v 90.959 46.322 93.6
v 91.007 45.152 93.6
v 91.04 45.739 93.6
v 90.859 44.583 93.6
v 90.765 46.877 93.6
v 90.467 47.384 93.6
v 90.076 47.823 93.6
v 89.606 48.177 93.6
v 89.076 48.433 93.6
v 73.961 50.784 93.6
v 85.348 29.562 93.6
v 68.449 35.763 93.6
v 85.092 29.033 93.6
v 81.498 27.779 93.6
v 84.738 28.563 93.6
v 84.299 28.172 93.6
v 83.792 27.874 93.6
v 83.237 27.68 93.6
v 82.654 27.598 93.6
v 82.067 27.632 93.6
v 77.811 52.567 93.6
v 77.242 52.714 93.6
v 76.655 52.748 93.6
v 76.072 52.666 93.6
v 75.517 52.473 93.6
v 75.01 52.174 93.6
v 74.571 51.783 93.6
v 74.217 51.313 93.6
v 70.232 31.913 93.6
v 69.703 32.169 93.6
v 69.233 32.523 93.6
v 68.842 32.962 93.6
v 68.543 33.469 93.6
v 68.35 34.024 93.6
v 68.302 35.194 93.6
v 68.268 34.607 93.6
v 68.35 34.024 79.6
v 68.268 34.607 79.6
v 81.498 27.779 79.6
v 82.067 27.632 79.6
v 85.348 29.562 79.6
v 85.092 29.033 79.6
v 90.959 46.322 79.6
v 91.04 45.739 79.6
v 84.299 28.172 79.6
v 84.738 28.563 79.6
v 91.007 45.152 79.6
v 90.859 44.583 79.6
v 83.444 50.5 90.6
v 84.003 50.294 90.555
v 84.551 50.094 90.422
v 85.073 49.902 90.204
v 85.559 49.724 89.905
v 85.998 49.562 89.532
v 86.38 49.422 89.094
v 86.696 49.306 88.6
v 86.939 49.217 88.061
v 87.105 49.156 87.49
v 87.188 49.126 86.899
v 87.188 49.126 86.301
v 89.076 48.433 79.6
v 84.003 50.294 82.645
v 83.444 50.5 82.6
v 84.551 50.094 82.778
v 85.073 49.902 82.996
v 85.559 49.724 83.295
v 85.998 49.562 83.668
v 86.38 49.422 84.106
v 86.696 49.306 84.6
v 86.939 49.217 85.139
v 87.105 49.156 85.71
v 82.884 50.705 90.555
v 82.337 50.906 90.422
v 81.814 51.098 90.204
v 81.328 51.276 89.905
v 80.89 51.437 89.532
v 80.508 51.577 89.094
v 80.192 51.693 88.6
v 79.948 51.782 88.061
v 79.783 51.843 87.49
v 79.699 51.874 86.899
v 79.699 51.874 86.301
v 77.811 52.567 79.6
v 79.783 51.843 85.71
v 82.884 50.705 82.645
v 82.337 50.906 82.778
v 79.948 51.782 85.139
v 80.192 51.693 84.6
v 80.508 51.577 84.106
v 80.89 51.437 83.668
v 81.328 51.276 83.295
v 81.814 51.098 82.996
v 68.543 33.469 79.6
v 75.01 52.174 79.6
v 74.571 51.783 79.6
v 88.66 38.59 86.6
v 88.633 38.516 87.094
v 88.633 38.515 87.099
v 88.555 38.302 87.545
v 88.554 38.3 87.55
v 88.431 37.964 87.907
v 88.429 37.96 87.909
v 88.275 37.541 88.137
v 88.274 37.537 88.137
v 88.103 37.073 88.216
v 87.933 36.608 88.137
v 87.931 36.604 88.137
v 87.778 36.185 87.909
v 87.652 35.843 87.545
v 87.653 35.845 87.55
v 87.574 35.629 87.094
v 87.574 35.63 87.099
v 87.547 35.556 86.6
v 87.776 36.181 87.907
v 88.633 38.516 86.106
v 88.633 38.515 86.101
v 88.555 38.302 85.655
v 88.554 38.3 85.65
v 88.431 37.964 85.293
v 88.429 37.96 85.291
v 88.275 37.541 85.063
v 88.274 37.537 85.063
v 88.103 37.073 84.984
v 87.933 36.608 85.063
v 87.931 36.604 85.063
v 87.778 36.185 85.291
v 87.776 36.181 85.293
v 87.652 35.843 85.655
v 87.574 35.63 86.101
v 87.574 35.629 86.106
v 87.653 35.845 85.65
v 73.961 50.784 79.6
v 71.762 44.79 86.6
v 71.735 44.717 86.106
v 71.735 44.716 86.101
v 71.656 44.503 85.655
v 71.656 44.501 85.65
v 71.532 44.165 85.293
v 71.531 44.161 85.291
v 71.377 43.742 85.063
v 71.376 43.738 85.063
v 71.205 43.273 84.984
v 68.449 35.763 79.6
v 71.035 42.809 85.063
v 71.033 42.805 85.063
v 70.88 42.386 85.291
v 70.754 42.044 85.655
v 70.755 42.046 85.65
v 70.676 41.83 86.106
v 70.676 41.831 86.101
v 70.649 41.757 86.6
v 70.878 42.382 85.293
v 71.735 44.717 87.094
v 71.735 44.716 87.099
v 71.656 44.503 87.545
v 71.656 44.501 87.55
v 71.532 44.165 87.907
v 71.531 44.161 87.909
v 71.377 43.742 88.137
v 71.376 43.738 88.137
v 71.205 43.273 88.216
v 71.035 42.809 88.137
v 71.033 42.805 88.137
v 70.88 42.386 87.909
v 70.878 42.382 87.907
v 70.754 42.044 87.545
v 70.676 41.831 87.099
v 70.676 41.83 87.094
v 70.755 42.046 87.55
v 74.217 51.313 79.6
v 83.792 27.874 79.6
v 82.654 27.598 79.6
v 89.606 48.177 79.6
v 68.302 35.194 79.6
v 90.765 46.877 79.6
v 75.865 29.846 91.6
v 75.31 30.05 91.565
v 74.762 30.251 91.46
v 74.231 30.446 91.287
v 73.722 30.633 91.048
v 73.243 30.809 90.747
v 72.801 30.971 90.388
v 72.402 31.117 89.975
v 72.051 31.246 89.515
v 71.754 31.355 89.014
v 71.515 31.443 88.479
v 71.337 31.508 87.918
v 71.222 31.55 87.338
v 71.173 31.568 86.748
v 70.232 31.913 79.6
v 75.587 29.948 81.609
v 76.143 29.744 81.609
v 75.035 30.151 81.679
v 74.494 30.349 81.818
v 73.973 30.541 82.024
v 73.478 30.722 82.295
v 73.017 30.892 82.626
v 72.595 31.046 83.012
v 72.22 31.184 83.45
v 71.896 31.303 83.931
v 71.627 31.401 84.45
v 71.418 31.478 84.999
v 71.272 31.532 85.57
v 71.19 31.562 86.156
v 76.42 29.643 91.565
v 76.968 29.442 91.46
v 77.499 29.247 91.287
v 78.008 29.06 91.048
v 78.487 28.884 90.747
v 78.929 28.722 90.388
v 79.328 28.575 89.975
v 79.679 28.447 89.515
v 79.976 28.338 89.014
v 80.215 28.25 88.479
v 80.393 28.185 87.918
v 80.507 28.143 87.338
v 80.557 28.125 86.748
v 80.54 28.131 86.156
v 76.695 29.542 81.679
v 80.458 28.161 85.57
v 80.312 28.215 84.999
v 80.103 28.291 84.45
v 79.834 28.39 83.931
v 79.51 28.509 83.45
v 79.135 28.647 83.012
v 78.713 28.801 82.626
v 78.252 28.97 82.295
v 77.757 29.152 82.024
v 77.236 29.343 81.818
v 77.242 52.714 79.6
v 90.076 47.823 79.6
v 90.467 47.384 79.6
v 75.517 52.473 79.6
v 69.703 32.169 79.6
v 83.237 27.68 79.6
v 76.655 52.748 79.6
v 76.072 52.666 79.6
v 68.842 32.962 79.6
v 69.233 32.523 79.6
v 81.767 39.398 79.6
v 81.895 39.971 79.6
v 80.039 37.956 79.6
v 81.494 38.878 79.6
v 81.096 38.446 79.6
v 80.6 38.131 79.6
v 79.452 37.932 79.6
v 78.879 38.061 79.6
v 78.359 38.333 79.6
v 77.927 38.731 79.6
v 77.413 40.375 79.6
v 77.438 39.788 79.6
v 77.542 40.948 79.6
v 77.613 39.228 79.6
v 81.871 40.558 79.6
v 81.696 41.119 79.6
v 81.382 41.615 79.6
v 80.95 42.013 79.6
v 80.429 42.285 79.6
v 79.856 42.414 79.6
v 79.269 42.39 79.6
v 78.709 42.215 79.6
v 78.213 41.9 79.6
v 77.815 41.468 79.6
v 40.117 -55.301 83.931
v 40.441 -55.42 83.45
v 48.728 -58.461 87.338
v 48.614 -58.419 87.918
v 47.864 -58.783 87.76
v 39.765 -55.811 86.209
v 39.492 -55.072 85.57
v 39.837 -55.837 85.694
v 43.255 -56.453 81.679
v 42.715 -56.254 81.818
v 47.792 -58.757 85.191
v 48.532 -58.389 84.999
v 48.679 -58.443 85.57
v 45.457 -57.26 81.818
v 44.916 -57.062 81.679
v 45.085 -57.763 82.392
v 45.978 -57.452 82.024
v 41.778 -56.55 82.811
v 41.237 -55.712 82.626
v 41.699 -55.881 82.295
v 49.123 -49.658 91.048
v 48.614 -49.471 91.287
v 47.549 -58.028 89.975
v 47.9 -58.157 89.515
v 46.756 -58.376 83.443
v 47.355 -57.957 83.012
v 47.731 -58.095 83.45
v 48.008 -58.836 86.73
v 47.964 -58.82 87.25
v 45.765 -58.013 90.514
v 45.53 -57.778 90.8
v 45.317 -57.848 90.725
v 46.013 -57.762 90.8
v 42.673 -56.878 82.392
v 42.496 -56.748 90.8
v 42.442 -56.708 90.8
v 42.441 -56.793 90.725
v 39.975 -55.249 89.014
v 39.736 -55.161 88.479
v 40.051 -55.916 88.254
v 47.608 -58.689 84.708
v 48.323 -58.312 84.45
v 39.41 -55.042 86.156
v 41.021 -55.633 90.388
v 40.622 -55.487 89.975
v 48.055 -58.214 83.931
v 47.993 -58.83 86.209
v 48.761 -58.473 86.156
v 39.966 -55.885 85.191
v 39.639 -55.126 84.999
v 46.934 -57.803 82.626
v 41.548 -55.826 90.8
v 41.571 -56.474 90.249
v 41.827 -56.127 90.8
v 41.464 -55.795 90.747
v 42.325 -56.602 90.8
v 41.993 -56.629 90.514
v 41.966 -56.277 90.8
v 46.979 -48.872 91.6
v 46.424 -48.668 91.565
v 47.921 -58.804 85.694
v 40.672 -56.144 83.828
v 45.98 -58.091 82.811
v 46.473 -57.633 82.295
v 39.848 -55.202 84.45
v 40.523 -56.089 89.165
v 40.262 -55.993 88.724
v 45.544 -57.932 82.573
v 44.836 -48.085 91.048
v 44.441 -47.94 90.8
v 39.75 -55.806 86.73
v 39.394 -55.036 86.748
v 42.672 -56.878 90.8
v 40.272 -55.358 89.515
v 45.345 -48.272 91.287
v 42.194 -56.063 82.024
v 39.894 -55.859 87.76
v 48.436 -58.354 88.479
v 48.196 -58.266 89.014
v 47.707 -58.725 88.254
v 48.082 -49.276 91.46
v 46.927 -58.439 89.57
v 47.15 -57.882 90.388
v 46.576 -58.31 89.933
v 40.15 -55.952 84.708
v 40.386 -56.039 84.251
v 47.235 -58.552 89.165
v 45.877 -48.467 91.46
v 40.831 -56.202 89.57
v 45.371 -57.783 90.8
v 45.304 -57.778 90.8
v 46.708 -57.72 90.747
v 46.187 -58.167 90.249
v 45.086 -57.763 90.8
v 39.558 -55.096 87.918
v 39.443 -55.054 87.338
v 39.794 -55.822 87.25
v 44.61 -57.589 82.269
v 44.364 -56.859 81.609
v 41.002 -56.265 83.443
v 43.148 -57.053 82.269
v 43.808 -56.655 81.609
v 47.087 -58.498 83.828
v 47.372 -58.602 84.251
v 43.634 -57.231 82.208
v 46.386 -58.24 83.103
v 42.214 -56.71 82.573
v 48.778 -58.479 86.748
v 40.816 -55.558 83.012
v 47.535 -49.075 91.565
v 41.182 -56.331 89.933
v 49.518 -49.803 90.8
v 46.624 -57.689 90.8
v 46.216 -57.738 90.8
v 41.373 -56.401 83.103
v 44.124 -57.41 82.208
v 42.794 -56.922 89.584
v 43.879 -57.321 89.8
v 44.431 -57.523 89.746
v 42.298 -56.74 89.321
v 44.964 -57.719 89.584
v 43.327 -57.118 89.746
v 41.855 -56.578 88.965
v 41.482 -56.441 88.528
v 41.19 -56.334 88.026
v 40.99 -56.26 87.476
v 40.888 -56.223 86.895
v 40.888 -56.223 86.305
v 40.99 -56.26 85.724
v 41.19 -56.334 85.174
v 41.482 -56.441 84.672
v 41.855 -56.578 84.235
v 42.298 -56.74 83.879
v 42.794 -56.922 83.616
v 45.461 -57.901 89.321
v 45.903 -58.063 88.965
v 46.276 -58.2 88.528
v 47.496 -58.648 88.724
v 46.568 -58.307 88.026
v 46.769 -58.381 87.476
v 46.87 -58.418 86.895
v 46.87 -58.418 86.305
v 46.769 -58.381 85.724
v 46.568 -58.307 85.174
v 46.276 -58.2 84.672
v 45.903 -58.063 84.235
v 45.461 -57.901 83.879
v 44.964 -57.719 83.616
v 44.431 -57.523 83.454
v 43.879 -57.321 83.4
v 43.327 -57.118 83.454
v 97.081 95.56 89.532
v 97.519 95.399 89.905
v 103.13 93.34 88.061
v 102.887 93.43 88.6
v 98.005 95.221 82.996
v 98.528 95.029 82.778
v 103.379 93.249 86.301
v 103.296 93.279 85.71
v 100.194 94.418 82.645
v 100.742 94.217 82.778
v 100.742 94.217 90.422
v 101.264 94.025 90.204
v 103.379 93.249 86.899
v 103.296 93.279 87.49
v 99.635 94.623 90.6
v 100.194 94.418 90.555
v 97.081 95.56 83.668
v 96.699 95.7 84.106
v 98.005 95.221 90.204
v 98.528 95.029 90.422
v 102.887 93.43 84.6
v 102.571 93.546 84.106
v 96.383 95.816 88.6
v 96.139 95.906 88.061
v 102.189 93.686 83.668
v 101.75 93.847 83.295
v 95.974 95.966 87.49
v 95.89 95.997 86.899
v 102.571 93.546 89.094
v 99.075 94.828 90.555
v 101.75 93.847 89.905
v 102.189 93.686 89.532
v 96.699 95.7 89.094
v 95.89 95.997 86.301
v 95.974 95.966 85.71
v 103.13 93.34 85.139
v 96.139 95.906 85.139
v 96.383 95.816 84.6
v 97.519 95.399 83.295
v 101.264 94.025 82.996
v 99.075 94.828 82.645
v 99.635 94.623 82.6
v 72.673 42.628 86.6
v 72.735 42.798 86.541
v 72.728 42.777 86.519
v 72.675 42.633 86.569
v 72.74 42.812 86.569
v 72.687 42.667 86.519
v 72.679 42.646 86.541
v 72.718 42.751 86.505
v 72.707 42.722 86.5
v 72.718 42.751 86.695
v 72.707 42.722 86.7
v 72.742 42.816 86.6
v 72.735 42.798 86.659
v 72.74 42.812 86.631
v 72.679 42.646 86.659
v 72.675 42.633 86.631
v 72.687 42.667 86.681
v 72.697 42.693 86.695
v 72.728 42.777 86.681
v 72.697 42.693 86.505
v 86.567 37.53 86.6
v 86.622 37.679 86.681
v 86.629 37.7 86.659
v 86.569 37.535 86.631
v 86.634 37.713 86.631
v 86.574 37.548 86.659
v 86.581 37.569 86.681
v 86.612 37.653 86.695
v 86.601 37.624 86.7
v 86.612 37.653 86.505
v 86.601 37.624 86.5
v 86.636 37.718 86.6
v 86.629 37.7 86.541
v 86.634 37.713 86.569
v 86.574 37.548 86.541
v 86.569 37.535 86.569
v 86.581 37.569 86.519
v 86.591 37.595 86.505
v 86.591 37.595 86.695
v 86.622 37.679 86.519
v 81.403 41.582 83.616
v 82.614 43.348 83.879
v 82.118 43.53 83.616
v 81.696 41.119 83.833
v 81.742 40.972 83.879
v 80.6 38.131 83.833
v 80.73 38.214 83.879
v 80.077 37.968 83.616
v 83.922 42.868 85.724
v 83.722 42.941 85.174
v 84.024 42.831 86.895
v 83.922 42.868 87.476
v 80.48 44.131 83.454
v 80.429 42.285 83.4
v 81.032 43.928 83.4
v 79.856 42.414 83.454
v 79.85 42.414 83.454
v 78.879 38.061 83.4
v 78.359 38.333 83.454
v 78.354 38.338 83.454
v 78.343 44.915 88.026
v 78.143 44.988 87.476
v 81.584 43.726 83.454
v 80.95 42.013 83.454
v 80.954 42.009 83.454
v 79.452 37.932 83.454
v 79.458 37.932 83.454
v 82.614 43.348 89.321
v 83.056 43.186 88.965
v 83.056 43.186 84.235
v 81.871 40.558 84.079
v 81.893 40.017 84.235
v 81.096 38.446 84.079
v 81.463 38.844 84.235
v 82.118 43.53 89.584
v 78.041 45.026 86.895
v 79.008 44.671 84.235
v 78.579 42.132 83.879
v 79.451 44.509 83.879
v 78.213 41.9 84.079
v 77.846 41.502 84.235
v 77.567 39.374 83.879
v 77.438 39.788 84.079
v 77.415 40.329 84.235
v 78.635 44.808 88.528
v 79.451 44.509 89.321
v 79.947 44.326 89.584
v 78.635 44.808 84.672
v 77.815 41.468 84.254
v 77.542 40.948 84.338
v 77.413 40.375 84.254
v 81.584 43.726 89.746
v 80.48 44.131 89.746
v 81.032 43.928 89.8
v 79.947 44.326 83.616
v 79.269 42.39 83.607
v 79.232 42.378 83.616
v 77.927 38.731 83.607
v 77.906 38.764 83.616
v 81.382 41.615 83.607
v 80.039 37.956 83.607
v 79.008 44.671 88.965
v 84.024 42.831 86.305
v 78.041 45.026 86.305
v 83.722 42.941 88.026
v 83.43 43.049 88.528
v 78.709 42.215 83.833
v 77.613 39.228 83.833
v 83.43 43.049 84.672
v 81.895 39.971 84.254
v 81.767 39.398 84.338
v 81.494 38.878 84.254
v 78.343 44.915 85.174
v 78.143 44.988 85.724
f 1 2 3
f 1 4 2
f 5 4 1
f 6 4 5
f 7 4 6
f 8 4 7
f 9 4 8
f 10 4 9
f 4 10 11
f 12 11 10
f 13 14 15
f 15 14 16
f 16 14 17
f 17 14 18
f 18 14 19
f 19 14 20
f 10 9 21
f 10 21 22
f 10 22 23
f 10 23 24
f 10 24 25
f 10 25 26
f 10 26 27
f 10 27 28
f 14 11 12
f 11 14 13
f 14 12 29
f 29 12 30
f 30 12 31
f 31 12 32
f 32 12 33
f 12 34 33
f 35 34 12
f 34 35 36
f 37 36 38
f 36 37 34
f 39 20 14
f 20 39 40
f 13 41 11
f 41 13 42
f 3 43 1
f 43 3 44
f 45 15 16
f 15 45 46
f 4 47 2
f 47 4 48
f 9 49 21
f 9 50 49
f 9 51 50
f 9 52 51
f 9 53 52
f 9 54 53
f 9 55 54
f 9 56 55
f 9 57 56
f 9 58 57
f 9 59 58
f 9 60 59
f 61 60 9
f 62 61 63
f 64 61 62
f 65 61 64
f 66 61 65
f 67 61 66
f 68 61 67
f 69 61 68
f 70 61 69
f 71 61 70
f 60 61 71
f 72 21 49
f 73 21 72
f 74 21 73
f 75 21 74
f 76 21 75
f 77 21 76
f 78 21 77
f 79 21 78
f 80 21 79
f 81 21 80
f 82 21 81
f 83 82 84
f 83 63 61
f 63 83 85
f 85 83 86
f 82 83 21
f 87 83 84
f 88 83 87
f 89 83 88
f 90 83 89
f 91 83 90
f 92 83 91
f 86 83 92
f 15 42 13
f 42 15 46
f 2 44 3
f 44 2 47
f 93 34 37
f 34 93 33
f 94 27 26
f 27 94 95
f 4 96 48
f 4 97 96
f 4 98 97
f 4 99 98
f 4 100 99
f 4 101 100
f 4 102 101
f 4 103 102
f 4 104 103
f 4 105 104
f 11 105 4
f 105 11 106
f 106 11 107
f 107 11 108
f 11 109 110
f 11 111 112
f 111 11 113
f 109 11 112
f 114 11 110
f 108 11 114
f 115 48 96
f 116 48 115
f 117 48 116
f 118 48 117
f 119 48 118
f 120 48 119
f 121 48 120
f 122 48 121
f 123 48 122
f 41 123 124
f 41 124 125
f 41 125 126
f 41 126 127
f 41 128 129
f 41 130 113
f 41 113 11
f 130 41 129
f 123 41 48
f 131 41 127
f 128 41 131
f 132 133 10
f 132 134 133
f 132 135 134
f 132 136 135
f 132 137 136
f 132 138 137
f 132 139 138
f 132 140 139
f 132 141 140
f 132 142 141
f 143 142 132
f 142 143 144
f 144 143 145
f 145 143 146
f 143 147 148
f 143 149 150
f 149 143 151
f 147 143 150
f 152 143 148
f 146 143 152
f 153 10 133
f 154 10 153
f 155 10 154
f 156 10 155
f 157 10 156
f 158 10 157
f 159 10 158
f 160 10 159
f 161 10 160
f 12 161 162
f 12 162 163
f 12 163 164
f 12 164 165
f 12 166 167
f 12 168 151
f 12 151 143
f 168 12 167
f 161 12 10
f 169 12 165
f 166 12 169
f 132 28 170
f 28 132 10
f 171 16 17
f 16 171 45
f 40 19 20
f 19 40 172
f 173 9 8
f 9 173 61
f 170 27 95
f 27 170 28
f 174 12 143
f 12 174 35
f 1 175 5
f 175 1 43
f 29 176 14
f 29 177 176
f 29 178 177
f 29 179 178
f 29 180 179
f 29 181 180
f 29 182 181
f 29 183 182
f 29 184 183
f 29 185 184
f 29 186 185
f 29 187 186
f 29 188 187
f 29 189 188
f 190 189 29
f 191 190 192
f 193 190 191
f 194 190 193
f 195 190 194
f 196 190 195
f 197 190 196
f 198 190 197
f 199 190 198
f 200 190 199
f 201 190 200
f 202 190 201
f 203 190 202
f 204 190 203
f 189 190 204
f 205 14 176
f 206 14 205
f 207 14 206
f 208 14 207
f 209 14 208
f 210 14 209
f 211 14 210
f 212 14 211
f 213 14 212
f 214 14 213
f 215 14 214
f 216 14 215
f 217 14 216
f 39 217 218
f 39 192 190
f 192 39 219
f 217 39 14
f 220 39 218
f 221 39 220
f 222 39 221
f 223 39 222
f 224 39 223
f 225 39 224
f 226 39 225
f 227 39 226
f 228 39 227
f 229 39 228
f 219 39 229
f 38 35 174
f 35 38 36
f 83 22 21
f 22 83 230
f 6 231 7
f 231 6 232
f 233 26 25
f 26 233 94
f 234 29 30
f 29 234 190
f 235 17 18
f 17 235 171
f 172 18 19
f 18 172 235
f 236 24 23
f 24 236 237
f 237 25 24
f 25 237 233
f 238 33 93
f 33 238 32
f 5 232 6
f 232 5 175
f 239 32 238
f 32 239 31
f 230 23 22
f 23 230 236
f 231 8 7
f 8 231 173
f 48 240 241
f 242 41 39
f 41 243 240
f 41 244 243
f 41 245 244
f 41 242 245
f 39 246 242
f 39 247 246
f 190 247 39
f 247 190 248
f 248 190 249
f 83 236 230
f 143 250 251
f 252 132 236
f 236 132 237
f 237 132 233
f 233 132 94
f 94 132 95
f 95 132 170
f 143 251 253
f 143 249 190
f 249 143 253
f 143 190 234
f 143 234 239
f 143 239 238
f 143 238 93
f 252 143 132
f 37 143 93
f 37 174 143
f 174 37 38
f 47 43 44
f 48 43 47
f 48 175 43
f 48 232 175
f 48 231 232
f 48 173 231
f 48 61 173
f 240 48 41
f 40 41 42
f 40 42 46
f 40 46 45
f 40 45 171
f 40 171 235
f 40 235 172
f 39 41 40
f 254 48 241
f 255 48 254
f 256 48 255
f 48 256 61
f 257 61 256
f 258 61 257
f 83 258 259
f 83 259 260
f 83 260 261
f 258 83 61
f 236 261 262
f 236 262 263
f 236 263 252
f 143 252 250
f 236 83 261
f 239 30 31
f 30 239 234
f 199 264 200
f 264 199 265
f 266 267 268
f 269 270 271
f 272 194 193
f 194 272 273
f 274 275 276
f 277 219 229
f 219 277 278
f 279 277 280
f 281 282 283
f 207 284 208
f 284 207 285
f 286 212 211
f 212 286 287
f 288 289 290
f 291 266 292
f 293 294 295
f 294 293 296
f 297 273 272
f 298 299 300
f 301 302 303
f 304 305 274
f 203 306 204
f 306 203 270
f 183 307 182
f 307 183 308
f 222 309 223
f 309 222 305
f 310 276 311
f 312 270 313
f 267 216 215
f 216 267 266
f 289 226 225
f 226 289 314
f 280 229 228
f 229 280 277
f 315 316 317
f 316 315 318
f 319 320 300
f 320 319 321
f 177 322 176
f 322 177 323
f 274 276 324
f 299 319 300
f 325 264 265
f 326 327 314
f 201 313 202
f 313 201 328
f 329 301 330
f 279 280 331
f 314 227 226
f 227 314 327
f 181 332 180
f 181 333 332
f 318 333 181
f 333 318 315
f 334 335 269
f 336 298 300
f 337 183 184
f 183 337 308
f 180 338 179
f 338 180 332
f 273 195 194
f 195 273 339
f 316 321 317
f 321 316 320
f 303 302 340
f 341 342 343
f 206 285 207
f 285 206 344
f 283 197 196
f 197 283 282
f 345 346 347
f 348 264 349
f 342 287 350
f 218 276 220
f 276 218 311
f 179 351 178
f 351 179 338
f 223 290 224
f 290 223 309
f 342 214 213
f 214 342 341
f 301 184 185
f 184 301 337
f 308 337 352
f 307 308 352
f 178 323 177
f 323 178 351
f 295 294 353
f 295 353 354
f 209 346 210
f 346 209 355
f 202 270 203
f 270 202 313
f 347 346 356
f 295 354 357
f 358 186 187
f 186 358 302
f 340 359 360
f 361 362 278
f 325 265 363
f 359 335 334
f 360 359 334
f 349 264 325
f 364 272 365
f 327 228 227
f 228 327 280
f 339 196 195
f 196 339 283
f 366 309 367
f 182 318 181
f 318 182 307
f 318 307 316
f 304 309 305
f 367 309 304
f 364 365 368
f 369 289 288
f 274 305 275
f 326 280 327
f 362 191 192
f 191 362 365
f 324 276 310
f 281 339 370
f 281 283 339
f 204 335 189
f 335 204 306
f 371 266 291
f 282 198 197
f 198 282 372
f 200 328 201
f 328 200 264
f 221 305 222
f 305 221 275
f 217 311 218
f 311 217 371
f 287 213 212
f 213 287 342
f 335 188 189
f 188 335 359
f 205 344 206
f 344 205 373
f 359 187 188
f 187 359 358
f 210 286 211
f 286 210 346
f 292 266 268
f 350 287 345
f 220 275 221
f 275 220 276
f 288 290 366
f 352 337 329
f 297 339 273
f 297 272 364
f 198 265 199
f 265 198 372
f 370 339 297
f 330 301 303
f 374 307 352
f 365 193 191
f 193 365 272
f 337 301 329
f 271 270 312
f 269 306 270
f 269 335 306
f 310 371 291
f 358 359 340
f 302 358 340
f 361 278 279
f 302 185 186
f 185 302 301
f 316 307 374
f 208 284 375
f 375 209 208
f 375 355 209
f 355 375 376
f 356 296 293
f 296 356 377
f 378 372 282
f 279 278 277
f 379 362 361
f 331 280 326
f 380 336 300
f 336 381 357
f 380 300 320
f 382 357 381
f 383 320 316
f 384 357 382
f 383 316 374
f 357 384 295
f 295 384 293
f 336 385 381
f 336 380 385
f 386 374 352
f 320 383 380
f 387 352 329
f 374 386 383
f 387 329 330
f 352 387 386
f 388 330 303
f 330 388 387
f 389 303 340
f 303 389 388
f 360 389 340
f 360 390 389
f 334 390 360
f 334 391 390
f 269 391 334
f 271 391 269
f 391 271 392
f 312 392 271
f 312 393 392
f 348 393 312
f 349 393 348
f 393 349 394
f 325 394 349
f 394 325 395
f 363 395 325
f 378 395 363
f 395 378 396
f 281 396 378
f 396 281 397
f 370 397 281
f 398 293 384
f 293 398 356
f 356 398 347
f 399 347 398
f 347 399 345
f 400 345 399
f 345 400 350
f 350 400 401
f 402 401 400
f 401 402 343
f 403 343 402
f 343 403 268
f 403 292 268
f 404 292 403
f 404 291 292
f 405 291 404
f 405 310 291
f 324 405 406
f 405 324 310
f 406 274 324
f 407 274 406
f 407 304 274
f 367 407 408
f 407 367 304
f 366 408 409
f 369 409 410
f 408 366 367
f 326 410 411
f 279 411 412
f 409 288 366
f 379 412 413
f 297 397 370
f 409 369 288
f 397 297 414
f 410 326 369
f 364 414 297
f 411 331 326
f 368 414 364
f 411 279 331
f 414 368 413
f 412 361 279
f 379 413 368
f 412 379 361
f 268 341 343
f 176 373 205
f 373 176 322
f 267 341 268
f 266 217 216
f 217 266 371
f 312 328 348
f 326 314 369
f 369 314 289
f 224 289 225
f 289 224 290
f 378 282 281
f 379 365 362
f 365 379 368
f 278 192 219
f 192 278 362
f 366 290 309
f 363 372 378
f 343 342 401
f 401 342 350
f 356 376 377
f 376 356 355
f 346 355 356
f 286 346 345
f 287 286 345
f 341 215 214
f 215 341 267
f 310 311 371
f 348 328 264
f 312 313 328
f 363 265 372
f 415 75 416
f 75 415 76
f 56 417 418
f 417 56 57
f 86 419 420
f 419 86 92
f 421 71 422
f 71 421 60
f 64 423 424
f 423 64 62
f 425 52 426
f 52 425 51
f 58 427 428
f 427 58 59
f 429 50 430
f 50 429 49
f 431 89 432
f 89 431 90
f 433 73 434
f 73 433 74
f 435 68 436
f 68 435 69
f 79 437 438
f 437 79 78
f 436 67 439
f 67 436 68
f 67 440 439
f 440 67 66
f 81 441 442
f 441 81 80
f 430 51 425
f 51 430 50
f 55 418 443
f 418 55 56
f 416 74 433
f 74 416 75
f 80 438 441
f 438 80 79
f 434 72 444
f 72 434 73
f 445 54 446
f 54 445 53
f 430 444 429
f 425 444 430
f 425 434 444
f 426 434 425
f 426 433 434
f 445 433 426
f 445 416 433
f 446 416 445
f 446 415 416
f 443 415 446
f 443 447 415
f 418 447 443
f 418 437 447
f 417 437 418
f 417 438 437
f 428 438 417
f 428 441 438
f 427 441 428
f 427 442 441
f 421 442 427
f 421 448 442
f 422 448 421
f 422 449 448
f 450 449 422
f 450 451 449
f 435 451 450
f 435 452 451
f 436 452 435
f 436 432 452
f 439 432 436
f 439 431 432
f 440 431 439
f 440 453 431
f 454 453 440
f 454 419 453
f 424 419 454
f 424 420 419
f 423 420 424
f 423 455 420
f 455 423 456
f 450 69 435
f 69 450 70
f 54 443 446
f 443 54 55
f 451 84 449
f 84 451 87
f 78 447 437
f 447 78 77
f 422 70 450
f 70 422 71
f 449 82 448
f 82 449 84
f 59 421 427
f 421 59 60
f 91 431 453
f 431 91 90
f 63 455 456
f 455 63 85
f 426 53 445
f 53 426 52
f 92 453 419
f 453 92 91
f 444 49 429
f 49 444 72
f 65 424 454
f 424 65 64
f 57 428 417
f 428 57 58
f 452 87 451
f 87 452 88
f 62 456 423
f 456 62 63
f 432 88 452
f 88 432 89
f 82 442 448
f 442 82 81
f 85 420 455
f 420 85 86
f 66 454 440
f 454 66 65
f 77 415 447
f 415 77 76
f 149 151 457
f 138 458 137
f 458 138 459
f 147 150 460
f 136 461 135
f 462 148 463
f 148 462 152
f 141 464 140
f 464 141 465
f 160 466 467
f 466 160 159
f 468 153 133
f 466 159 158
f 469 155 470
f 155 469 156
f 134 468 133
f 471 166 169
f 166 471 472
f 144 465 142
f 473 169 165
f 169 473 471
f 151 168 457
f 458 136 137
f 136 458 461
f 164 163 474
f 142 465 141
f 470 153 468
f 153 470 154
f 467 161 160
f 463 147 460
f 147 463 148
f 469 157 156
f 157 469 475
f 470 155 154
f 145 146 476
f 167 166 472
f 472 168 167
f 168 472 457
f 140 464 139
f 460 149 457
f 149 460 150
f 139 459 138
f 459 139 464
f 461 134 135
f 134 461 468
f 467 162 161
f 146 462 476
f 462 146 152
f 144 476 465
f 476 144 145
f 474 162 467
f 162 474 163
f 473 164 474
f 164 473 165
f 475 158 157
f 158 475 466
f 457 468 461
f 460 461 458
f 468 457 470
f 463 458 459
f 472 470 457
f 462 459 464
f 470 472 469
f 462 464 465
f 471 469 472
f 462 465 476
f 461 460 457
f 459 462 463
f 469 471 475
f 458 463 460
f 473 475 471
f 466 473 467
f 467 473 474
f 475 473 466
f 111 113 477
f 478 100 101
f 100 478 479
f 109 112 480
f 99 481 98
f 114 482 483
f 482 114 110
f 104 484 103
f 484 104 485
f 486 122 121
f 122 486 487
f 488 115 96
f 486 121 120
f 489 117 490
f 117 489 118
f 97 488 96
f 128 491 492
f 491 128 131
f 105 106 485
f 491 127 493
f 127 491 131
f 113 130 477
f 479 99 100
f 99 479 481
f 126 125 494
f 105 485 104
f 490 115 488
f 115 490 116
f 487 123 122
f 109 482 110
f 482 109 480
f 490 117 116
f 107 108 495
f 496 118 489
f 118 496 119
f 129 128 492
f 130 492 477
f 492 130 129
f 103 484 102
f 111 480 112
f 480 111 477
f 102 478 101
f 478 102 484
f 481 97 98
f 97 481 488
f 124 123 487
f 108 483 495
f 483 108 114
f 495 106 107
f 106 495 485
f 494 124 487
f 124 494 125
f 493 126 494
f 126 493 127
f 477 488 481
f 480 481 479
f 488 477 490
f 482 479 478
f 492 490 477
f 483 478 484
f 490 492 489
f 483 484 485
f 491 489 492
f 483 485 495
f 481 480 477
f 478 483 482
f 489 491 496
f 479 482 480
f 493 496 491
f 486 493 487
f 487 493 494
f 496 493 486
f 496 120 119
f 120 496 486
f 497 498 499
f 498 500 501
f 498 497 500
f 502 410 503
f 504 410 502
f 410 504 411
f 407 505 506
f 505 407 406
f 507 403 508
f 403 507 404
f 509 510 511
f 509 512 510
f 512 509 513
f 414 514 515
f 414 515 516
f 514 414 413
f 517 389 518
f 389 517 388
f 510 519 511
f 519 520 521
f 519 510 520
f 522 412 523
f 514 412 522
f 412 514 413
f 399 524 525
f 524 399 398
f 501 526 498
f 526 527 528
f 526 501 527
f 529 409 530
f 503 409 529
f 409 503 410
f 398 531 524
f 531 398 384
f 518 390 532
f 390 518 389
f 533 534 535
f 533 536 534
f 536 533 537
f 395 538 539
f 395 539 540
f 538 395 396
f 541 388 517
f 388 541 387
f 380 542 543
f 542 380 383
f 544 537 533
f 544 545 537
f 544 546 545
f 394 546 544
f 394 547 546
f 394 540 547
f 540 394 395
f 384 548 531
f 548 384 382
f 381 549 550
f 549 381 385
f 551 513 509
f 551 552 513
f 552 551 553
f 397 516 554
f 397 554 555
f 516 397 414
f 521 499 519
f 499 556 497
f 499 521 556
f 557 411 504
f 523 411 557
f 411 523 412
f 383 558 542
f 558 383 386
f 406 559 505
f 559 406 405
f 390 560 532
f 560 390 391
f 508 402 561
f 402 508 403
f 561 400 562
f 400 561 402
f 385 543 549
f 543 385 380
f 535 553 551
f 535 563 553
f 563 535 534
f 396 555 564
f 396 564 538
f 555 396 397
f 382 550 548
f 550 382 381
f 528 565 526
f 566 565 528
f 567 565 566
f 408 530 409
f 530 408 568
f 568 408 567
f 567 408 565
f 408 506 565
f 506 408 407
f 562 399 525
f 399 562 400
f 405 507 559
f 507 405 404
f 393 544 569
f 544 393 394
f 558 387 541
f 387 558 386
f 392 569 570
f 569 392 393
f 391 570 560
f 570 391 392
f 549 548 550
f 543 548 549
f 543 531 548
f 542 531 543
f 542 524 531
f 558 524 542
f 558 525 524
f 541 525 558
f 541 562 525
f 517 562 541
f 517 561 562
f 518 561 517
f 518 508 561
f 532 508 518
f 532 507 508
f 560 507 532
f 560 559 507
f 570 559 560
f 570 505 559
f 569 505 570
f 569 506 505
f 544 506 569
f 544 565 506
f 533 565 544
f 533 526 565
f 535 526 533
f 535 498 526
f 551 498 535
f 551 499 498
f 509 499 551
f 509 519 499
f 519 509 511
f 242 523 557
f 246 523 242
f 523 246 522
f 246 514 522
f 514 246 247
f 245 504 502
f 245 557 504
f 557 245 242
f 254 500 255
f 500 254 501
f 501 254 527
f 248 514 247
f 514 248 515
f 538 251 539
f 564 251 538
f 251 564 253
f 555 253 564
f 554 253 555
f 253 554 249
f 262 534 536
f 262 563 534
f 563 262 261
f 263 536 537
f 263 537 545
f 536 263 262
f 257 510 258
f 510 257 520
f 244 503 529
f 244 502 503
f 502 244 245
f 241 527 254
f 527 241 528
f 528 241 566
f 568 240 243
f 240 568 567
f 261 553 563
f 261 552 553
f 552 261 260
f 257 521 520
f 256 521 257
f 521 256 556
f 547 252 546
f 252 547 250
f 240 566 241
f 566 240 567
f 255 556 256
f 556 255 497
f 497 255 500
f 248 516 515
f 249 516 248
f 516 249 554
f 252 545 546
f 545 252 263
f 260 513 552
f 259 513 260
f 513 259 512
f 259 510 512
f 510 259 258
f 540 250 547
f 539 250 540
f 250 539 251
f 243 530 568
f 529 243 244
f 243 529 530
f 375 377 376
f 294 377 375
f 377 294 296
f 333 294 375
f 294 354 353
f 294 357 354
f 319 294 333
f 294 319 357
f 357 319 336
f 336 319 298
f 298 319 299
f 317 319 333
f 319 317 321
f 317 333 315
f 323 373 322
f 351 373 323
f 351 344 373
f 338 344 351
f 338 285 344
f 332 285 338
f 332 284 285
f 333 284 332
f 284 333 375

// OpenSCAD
// file: ../lib/common.scad
// ============================================================================
//  Вспомогательные модули общего назначения.
//  Подключать через use <lib/common.scad> — файл не содержит параметров
//  проекта и ни от чего не зависит.
// ============================================================================

_eps = 0.01;

// --------------------------------------------------------------------- 2D ---
// Прямоугольник со скруглёнными углами, по центру
module rrect(w, d, r) {
    rr = min(r, w/2 - _eps, d/2 - _eps);
    if (rr > 0) offset(r = rr) square([w - 2*rr, d - 2*rr], center = true);
    else square([w, d], center = true);
}

// --------------------------------------------------------------------- 3D ---
// Коробка со скруглением ТОЛЬКО вертикальных рёбер: нижние и верхние острые
module rounded_box(w, d, h, r) linear_extrude(height = h) rrect(w, d, r);

// Цилиндр с фасками на торцах (снимает «слоновью ногу» и облегчает посадку)
module chamfered_cyl(d, h, ch = 0.6, bottom = true, top = true) {
    r  = d/2;
    cb = bottom ? min(ch, h/2) : 0;
    ct = top    ? min(ch, h/2) : 0;
    if (cb <= 0 && ct <= 0) cylinder(d = d, h = h);
    else rotate_extrude(angle = 360) polygon(concat(
        [[0, 0]],
        cb > 0 ? [[r - cb, 0], [r, cb]] : [[r, 0]],
        ct > 0 ? [[r, h - ct], [r - ct, h]] : [[r, h]],
        [[0, h]]));
}

// Труба
module tube(od, id, h) difference() {
    cylinder(d = od, h = h);
    translate([0, 0, -_eps]) cylinder(d = id, h = h + 2*_eps);
}

// Сквозное отверстие, растянутое вверх-вниз для гарантированного вычитания
module thru(d, h) translate([0, 0, -_eps]) cylinder(d = d, h = h + 2*_eps);

// Потайное отверстие под саморез с конической головкой.
// Пластина занимает z = [0 .. t], головка утапливается сверху,
// саморез идёт вниз (в ответную стойку).
module countersunk_hole(free_d, head_d, t, down = 30) {
    cone_h = (head_d - free_d)/2;    // головка 90 градусов
    union() {
        translate([0, 0, -down]) cylinder(d = free_d, h = down + t - cone_h + _eps);
        translate([0, 0, t - cone_h]) cylinder(d1 = free_d, d2 = head_d, h = cone_h);
    }
}

// Паз (щелевое отверстие) длиной len по X, сквозной по высоте h
module slot(len, d, h) hull() for (s = [-1, 1])
    translate([s*(len - d)/2, 0, 0]) cylinder(d = d, h = h);

// Стойка под саморез: цилиндр с пилотным отверстием сверху.
// Снизу фаски нет — стойка растёт из дна детали.
module screw_boss(od, h, pilot_d, pilot_depth, ch = 0.6) difference() {
    chamfered_cyl(od, h, ch = ch, bottom = false, top = true);
    translate([0, 0, h - pilot_depth]) cylinder(d = pilot_d, h = pilot_depth + _eps);
}

// Треугольная косынка в плоскости XZ (катеты l по X и h по Z), толщина t по Y
module gusset(l, h, t) translate([0, -t/2, 0]) linear_extrude(height = t)
    polygon([[0, 0], [l, 0], [0, h]]);

// Конусное гнездо под заточенный винт-ось (ось Z вниз от z=0)
module cone_seat(d, depth) translate([0, 0, -depth])
    cylinder(d1 = 0.2, d2 = d, h = depth + _eps);

// Канавка под круглый пассик: тор, вычитаемый из обода
module belt_groove(pulley_d, groove_r) rotate_extrude(angle = 360)
    translate([pulley_d/2, 0]) circle(r = groove_r);

// Сетка облегчающих отверстий по кругу
module radial_holes(n, r, d, h) for (i = [0 : n - 1])
    rotate([0, 0, i*360/n]) translate([r, 0, 0]) thru(d, h);
// main file
// ============================================================================
//  ТОНАРМ: ступица качания + трубка + хвостовик противовеса
//
//  Головка звукоснимателя — отдельная деталь (tonearm_headshell.scad),
//  она надевается хомутом на конец трубки. Поэтому трубка здесь открыта с
//  торца: провод от AT91 протягивается насквозь ещё до установки головки,
//  выходит вниз из ступицы, дальше через палец вертикальной оси и стойку —
//  внутрь корпуса. Слабина провода служит и токоподводом, и мягким
//  ограничителем поворота. Микролифта нет (сознательно, см. README).
//
//  Геометрия трубки (длина, углы) считается в params.scad из эффективной
//  длины, выноса и разворота головки — см. раздел про тонарм в README.
//
//  Печать: деталь длинная, печатать лежа; ступица ложится на стол, под
//  трубку — лёгкие поддержки. Альтернатива на будущее: карбоновая трубка
//  10x1 вместо печатной.
// ============================================================================

include <../params.scad>
use <../lib/common.scad>

module tonearm_arm(az = arm_tube_azimuth_at(arm_groove_r_out)) {
    translate([arm_pivot_pos[0], arm_pivot_pos[1], arm_axis_z]) rotate([0, 0, az])
    difference() {
        union() {
            // ---- ступица качания ----
            translate([0, 0, -arm_hub_h/2])
                linear_extrude(height = arm_hub_h)
                    rrect(arm_hub_len, arm_hub_w, 3);
            // ---- трубка (торец с фаской — по нему надевается хомут) ----
            rotate([0, 90, 0])
                chamfered_cyl(arm_tube_od, arm_tube_reach, ch = 0.6,
                              bottom = false, top = true);
            // ---- хвостовик противовеса ----
            rotate([0, -90, 0])
                cylinder(d = arm_cw_stub_d, h = arm_cw_stub_len);
        }
        // ---- конусные гнёзда осей качания (конус 90 град, как заточка
        //      винта); начинаются чуть снаружи, чтобы срез был чистым ----
        for (s = [-1, 1])
            translate([0, s*(arm_hub_w/2 + 0.3), 0]) rotate([s*90, 0, 0])
                cylinder(d1 = arm_pivot_cone_d + 0.6, d2 = 0.2,
                         h = arm_pivot_cone_depth + 0.3);
        // ---- канал сигнального провода ----
        // Канал заходит за ось качания, чтобы вертикальный выход попадал в
        // него целиком, а не упирался в слепой карман.
        translate([-4, 0, 0]) rotate([0, 90, 0])
            cylinder(d = arm_tube_id, h = arm_tube_reach + 4 + eps);
        translate([0, 0, -arm_hub_h/2 - eps])
            cylinder(d = arm_wire_exit_d, h = arm_hub_h/2 + 2);
        // ---- лыска под прижимной винт хомута головки ----
        // Она же задаёт повторяемое угловое положение головки.
        translate([arm_tube_reach - arm_joint_len, -arm_tube_od, arm_joint_scr_z])
            cube([arm_joint_len + 1, 2*arm_tube_od, arm_tube_od]);
    }
}

tonearm_arm();
